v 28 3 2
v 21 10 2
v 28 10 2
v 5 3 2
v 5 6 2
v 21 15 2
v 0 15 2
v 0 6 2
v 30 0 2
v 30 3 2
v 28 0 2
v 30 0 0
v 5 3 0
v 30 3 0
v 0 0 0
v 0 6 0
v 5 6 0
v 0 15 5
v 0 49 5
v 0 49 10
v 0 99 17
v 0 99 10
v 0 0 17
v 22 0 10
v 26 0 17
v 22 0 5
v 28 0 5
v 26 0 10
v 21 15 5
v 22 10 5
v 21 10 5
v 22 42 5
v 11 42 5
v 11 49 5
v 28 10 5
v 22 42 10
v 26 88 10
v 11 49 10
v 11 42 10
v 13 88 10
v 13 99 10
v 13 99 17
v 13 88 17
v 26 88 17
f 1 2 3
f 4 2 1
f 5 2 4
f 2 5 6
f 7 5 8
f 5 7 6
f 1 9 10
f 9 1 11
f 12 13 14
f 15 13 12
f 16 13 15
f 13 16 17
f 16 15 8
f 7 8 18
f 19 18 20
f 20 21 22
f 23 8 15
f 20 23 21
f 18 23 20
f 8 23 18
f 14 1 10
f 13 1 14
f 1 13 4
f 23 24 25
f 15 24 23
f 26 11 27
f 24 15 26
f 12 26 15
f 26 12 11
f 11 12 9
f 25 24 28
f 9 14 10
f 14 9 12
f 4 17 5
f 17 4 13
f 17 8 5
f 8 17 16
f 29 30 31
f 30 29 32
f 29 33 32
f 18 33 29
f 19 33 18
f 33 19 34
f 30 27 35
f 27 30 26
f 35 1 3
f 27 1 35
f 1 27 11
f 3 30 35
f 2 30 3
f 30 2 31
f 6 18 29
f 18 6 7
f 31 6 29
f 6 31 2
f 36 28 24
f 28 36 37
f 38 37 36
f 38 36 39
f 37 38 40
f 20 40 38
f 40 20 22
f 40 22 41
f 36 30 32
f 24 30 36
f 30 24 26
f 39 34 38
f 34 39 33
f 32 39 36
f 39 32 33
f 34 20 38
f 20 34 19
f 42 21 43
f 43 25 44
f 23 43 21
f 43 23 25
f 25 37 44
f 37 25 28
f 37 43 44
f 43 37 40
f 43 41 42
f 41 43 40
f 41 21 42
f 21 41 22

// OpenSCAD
translate([2.5, 1.5, 1.0]) color([0.28953085363586695, 0.39479198298829066, 0.5484842965725134]) cube([5, 3, 2], center=true);
translate([7.5, 1.5, 1.0]) color([0.29340700145733656, 0.47806466915102097, 0.2397060836386239]) cube([5, 3, 2], center=true);
translate([12.5, 1.5, 1.0]) color([0.04825636228829444, 0.17958684904155564, 0.5230502317000981]) cube([5, 3, 2], center=true);
translate([17.5, 1.5, 1.0]) color([0.07086288409434749, 0.4031691464450935, 0.3285207100154869]) cube([5, 3, 2], center=true);
translate([22.5, 1.5, 1.0]) color([0.4147216089714424, 0.09940033823870109, 0.9086575543967805]) cube([5, 3, 2], center=true);
translate([27.5, 1.5, 1.0]) color([0.4740046511372964, 0.8408483326276716, 0.976229457649057]) cube([5, 3, 2], center=true);
translate([2.5, 4.5, 1.0]) color([0.34365159365776776, 0.4790865191519861, 0.6995952911506185]) cube([5, 3, 2], center=true);
translate([3.5, 2.5, 3.5]) color([0.42653532354402823, 0.30190311621935595, 0.7347509912186152]) cube([7, 5, 3], center=true);
translate([10.5, 2.5, 3.5]) color([0.8943997782145745, 0.9196888444316101, 0.6267420468068673]) cube([7, 5, 3], center=true);
translate([17.5, 2.5, 3.5]) color([0.3755713463285453, 0.9745605214796941, 0.6388785175004733]) cube([7, 5, 3], center=true);
translate([24.5, 2.5, 3.5]) color([0.06583467727730097, 0.08466956912011114, 0.749869571783086]) cube([7, 5, 3], center=true);
translate([3.5, 7.5, 3.5]) color([0.06115615654596607, 0.007851005331251826, 0.39380795178170946]) cube([7, 5, 3], center=true);
translate([10.5, 7.5, 3.5]) color([0.5190037287013293, 0.44854428559655457, 0.48861880442715255]) cube([7, 5, 3], center=true);
translate([17.5, 7.5, 3.5]) color([0.5848887019932744, 0.6793025673721249, 0.4230380735074225]) cube([7, 5, 3], center=true);
translate([24.5, 7.5, 3.5]) color([0.3683314563344259, 0.9884590580992895, 0.26091653544625626]) cube([7, 5, 3], center=true);
translate([3.5, 12.5, 3.5]) color([0.7771001545085096, 0.43122102463204415, 0.35852038200953895]) cube([7, 5, 3], center=true);
translate([10.5, 12.5, 3.5]) color([0.06385794894382868, 0.8635789443020424, 0.7020041497619371]) cube([7, 5, 3], center=true);
translate([17.5, 12.5, 3.5]) color([0.9030107075409272, 0.4516117926868677, 0.6769209668166035]) cube([7, 5, 3], center=true);
translate([5.5, 3.5, 7.5]) color([0.11891028655385572, 0.3979536016023134, 0.20723197341708288]) cube([11, 7, 5], center=true);
translate([16.5, 3.5, 7.5]) color([0.04210142789066196, 0.94796135125632, 0.21589436846535714]) cube([11, 7, 5], center=true);
translate([5.5, 10.5, 7.5]) color([0.1463544898080057, 0.19797004355794223, 0.37803196431429753]) cube([11, 7, 5], center=true);
translate([16.5, 10.5, 7.5]) color([0.5463912623151137, 0.15133436847289106, 0.9886898889857565]) cube([11, 7, 5], center=true);
translate([5.5, 17.5, 7.5]) color([0.9829892105452821, 0.14840201708602985, 0.4059068831679489]) cube([11, 7, 5], center=true);
translate([16.5, 17.5, 7.5]) color([0.6799294831100022, 0.8776565829010952, 0.49540592491118873]) cube([11, 7, 5], center=true);
translate([5.5, 24.5, 7.5]) color([0.9170466727598151, 0.3224603148813061, 0.4984408914907503]) cube([11, 7, 5], center=true);
translate([16.5, 24.5, 7.5]) color([0.4986465918650089, 0.6700681513152942, 0.2019913087994536]) cube([11, 7, 5], center=true);
translate([5.5, 31.5, 7.5]) color([0.6097706104167804, 0.21877309687215574, 0.340220315051032]) cube([11, 7, 5], center=true);
translate([16.5, 31.5, 7.5]) color([0.9625664632546818, 0.8990080380310076, 0.8181183809177941]) cube([11, 7, 5], center=true);
translate([5.5, 38.5, 7.5]) color([0.035468261876012264, 0.14836688246192975, 0.2568819120719038]) cube([11, 7, 5], center=true);
translate([16.5, 38.5, 7.5]) color([0.7841665681891542, 0.8423333270773672, 0.5829481802462215]) cube([11, 7, 5], center=true);
translate([5.5, 45.5, 7.5]) color([0.7181316517768294, 0.8070553799750758, 0.06635913103778524]) cube([11, 7, 5], center=true);
translate([6.5, 5.5, 13.5]) color([0.08464313683307012, 0.8688953140043785, 0.03941582937802879]) cube([13, 11, 7], center=true);
translate([19.5, 5.5, 13.5]) color([0.22509065367649606, 0.04063202664590093, 0.015285139969726802]) cube([13, 11, 7], center=true);
translate([6.5, 16.5, 13.5]) color([0.8439546856924078, 0.3305943672500803, 0.1606900602627206]) cube([13, 11, 7], center=true);
translate([19.5, 16.5, 13.5]) color([0.1488194902889095, 0.656083661770337, 0.9685982716927071]) cube([13, 11, 7], center=true);
translate([6.5, 27.5, 13.5]) color([0.5049996926056783, 0.9010904768840049, 0.5024285989524275]) cube([13, 11, 7], center=true);
translate([19.5, 27.5, 13.5]) color([0.5738724774915492, 0.6785713567893591, 0.805109989032137]) cube([13, 11, 7], center=true);
translate([6.5, 38.5, 13.5]) color([0.7578463822613826, 0.9905325627055622, 0.7469653891501328]) cube([13, 11, 7], center=true);
translate([19.5, 38.5, 13.5]) color([0.9057807233528663, 0.20610483206558328, 0.535416304328581]) cube([13, 11, 7], center=true);
translate([6.5, 49.5, 13.5]) color([0.5986142636674691, 0.8256966171603538, 0.4822135630659161]) cube([13, 11, 7], center=true);
translate([19.5, 49.5, 13.5]) color([0.7910402117090956, 0.3885688901501142, 0.5863884555814496]) cube([13, 11, 7], center=true);
translate([6.5, 60.5, 13.5]) color([0.8513166074810679, 0.7980594711041583, 0.6569845518861341]) cube([13, 11, 7], center=true);
translate([19.5, 60.5, 13.5]) color([0.00024069652516689466, 0.18196892218621108, 0.5068577868511277]) cube([13, 11, 7], center=true);
translate([6.5, 71.5, 13.5]) color([0.2544593984833793, 0.06562084327273077, 0.8598834221214616]) cube([13, 11, 7], center=true);
translate([19.5, 71.5, 13.5]) color([0.9429470213131631, 0.3028048781490337, 0.40807316738486077]) cube([13, 11, 7], center=true);
translate([6.5, 82.5, 13.5]) color([0.8100375338172869, 0.06225875887122312, 0.6409848625624502]) cube([13, 11, 7], center=true);
translate([19.5, 82.5, 13.5]) color([0.12732081293278708, 0.2870883399952252, 0.829940686628406]) cube([13, 11, 7], center=true);
translate([6.5, 93.5, 13.5]) color([0.0555270458896614, 0.035933833430188966, 0.4178660447962945]) cube([13, 11, 7], center=true);
